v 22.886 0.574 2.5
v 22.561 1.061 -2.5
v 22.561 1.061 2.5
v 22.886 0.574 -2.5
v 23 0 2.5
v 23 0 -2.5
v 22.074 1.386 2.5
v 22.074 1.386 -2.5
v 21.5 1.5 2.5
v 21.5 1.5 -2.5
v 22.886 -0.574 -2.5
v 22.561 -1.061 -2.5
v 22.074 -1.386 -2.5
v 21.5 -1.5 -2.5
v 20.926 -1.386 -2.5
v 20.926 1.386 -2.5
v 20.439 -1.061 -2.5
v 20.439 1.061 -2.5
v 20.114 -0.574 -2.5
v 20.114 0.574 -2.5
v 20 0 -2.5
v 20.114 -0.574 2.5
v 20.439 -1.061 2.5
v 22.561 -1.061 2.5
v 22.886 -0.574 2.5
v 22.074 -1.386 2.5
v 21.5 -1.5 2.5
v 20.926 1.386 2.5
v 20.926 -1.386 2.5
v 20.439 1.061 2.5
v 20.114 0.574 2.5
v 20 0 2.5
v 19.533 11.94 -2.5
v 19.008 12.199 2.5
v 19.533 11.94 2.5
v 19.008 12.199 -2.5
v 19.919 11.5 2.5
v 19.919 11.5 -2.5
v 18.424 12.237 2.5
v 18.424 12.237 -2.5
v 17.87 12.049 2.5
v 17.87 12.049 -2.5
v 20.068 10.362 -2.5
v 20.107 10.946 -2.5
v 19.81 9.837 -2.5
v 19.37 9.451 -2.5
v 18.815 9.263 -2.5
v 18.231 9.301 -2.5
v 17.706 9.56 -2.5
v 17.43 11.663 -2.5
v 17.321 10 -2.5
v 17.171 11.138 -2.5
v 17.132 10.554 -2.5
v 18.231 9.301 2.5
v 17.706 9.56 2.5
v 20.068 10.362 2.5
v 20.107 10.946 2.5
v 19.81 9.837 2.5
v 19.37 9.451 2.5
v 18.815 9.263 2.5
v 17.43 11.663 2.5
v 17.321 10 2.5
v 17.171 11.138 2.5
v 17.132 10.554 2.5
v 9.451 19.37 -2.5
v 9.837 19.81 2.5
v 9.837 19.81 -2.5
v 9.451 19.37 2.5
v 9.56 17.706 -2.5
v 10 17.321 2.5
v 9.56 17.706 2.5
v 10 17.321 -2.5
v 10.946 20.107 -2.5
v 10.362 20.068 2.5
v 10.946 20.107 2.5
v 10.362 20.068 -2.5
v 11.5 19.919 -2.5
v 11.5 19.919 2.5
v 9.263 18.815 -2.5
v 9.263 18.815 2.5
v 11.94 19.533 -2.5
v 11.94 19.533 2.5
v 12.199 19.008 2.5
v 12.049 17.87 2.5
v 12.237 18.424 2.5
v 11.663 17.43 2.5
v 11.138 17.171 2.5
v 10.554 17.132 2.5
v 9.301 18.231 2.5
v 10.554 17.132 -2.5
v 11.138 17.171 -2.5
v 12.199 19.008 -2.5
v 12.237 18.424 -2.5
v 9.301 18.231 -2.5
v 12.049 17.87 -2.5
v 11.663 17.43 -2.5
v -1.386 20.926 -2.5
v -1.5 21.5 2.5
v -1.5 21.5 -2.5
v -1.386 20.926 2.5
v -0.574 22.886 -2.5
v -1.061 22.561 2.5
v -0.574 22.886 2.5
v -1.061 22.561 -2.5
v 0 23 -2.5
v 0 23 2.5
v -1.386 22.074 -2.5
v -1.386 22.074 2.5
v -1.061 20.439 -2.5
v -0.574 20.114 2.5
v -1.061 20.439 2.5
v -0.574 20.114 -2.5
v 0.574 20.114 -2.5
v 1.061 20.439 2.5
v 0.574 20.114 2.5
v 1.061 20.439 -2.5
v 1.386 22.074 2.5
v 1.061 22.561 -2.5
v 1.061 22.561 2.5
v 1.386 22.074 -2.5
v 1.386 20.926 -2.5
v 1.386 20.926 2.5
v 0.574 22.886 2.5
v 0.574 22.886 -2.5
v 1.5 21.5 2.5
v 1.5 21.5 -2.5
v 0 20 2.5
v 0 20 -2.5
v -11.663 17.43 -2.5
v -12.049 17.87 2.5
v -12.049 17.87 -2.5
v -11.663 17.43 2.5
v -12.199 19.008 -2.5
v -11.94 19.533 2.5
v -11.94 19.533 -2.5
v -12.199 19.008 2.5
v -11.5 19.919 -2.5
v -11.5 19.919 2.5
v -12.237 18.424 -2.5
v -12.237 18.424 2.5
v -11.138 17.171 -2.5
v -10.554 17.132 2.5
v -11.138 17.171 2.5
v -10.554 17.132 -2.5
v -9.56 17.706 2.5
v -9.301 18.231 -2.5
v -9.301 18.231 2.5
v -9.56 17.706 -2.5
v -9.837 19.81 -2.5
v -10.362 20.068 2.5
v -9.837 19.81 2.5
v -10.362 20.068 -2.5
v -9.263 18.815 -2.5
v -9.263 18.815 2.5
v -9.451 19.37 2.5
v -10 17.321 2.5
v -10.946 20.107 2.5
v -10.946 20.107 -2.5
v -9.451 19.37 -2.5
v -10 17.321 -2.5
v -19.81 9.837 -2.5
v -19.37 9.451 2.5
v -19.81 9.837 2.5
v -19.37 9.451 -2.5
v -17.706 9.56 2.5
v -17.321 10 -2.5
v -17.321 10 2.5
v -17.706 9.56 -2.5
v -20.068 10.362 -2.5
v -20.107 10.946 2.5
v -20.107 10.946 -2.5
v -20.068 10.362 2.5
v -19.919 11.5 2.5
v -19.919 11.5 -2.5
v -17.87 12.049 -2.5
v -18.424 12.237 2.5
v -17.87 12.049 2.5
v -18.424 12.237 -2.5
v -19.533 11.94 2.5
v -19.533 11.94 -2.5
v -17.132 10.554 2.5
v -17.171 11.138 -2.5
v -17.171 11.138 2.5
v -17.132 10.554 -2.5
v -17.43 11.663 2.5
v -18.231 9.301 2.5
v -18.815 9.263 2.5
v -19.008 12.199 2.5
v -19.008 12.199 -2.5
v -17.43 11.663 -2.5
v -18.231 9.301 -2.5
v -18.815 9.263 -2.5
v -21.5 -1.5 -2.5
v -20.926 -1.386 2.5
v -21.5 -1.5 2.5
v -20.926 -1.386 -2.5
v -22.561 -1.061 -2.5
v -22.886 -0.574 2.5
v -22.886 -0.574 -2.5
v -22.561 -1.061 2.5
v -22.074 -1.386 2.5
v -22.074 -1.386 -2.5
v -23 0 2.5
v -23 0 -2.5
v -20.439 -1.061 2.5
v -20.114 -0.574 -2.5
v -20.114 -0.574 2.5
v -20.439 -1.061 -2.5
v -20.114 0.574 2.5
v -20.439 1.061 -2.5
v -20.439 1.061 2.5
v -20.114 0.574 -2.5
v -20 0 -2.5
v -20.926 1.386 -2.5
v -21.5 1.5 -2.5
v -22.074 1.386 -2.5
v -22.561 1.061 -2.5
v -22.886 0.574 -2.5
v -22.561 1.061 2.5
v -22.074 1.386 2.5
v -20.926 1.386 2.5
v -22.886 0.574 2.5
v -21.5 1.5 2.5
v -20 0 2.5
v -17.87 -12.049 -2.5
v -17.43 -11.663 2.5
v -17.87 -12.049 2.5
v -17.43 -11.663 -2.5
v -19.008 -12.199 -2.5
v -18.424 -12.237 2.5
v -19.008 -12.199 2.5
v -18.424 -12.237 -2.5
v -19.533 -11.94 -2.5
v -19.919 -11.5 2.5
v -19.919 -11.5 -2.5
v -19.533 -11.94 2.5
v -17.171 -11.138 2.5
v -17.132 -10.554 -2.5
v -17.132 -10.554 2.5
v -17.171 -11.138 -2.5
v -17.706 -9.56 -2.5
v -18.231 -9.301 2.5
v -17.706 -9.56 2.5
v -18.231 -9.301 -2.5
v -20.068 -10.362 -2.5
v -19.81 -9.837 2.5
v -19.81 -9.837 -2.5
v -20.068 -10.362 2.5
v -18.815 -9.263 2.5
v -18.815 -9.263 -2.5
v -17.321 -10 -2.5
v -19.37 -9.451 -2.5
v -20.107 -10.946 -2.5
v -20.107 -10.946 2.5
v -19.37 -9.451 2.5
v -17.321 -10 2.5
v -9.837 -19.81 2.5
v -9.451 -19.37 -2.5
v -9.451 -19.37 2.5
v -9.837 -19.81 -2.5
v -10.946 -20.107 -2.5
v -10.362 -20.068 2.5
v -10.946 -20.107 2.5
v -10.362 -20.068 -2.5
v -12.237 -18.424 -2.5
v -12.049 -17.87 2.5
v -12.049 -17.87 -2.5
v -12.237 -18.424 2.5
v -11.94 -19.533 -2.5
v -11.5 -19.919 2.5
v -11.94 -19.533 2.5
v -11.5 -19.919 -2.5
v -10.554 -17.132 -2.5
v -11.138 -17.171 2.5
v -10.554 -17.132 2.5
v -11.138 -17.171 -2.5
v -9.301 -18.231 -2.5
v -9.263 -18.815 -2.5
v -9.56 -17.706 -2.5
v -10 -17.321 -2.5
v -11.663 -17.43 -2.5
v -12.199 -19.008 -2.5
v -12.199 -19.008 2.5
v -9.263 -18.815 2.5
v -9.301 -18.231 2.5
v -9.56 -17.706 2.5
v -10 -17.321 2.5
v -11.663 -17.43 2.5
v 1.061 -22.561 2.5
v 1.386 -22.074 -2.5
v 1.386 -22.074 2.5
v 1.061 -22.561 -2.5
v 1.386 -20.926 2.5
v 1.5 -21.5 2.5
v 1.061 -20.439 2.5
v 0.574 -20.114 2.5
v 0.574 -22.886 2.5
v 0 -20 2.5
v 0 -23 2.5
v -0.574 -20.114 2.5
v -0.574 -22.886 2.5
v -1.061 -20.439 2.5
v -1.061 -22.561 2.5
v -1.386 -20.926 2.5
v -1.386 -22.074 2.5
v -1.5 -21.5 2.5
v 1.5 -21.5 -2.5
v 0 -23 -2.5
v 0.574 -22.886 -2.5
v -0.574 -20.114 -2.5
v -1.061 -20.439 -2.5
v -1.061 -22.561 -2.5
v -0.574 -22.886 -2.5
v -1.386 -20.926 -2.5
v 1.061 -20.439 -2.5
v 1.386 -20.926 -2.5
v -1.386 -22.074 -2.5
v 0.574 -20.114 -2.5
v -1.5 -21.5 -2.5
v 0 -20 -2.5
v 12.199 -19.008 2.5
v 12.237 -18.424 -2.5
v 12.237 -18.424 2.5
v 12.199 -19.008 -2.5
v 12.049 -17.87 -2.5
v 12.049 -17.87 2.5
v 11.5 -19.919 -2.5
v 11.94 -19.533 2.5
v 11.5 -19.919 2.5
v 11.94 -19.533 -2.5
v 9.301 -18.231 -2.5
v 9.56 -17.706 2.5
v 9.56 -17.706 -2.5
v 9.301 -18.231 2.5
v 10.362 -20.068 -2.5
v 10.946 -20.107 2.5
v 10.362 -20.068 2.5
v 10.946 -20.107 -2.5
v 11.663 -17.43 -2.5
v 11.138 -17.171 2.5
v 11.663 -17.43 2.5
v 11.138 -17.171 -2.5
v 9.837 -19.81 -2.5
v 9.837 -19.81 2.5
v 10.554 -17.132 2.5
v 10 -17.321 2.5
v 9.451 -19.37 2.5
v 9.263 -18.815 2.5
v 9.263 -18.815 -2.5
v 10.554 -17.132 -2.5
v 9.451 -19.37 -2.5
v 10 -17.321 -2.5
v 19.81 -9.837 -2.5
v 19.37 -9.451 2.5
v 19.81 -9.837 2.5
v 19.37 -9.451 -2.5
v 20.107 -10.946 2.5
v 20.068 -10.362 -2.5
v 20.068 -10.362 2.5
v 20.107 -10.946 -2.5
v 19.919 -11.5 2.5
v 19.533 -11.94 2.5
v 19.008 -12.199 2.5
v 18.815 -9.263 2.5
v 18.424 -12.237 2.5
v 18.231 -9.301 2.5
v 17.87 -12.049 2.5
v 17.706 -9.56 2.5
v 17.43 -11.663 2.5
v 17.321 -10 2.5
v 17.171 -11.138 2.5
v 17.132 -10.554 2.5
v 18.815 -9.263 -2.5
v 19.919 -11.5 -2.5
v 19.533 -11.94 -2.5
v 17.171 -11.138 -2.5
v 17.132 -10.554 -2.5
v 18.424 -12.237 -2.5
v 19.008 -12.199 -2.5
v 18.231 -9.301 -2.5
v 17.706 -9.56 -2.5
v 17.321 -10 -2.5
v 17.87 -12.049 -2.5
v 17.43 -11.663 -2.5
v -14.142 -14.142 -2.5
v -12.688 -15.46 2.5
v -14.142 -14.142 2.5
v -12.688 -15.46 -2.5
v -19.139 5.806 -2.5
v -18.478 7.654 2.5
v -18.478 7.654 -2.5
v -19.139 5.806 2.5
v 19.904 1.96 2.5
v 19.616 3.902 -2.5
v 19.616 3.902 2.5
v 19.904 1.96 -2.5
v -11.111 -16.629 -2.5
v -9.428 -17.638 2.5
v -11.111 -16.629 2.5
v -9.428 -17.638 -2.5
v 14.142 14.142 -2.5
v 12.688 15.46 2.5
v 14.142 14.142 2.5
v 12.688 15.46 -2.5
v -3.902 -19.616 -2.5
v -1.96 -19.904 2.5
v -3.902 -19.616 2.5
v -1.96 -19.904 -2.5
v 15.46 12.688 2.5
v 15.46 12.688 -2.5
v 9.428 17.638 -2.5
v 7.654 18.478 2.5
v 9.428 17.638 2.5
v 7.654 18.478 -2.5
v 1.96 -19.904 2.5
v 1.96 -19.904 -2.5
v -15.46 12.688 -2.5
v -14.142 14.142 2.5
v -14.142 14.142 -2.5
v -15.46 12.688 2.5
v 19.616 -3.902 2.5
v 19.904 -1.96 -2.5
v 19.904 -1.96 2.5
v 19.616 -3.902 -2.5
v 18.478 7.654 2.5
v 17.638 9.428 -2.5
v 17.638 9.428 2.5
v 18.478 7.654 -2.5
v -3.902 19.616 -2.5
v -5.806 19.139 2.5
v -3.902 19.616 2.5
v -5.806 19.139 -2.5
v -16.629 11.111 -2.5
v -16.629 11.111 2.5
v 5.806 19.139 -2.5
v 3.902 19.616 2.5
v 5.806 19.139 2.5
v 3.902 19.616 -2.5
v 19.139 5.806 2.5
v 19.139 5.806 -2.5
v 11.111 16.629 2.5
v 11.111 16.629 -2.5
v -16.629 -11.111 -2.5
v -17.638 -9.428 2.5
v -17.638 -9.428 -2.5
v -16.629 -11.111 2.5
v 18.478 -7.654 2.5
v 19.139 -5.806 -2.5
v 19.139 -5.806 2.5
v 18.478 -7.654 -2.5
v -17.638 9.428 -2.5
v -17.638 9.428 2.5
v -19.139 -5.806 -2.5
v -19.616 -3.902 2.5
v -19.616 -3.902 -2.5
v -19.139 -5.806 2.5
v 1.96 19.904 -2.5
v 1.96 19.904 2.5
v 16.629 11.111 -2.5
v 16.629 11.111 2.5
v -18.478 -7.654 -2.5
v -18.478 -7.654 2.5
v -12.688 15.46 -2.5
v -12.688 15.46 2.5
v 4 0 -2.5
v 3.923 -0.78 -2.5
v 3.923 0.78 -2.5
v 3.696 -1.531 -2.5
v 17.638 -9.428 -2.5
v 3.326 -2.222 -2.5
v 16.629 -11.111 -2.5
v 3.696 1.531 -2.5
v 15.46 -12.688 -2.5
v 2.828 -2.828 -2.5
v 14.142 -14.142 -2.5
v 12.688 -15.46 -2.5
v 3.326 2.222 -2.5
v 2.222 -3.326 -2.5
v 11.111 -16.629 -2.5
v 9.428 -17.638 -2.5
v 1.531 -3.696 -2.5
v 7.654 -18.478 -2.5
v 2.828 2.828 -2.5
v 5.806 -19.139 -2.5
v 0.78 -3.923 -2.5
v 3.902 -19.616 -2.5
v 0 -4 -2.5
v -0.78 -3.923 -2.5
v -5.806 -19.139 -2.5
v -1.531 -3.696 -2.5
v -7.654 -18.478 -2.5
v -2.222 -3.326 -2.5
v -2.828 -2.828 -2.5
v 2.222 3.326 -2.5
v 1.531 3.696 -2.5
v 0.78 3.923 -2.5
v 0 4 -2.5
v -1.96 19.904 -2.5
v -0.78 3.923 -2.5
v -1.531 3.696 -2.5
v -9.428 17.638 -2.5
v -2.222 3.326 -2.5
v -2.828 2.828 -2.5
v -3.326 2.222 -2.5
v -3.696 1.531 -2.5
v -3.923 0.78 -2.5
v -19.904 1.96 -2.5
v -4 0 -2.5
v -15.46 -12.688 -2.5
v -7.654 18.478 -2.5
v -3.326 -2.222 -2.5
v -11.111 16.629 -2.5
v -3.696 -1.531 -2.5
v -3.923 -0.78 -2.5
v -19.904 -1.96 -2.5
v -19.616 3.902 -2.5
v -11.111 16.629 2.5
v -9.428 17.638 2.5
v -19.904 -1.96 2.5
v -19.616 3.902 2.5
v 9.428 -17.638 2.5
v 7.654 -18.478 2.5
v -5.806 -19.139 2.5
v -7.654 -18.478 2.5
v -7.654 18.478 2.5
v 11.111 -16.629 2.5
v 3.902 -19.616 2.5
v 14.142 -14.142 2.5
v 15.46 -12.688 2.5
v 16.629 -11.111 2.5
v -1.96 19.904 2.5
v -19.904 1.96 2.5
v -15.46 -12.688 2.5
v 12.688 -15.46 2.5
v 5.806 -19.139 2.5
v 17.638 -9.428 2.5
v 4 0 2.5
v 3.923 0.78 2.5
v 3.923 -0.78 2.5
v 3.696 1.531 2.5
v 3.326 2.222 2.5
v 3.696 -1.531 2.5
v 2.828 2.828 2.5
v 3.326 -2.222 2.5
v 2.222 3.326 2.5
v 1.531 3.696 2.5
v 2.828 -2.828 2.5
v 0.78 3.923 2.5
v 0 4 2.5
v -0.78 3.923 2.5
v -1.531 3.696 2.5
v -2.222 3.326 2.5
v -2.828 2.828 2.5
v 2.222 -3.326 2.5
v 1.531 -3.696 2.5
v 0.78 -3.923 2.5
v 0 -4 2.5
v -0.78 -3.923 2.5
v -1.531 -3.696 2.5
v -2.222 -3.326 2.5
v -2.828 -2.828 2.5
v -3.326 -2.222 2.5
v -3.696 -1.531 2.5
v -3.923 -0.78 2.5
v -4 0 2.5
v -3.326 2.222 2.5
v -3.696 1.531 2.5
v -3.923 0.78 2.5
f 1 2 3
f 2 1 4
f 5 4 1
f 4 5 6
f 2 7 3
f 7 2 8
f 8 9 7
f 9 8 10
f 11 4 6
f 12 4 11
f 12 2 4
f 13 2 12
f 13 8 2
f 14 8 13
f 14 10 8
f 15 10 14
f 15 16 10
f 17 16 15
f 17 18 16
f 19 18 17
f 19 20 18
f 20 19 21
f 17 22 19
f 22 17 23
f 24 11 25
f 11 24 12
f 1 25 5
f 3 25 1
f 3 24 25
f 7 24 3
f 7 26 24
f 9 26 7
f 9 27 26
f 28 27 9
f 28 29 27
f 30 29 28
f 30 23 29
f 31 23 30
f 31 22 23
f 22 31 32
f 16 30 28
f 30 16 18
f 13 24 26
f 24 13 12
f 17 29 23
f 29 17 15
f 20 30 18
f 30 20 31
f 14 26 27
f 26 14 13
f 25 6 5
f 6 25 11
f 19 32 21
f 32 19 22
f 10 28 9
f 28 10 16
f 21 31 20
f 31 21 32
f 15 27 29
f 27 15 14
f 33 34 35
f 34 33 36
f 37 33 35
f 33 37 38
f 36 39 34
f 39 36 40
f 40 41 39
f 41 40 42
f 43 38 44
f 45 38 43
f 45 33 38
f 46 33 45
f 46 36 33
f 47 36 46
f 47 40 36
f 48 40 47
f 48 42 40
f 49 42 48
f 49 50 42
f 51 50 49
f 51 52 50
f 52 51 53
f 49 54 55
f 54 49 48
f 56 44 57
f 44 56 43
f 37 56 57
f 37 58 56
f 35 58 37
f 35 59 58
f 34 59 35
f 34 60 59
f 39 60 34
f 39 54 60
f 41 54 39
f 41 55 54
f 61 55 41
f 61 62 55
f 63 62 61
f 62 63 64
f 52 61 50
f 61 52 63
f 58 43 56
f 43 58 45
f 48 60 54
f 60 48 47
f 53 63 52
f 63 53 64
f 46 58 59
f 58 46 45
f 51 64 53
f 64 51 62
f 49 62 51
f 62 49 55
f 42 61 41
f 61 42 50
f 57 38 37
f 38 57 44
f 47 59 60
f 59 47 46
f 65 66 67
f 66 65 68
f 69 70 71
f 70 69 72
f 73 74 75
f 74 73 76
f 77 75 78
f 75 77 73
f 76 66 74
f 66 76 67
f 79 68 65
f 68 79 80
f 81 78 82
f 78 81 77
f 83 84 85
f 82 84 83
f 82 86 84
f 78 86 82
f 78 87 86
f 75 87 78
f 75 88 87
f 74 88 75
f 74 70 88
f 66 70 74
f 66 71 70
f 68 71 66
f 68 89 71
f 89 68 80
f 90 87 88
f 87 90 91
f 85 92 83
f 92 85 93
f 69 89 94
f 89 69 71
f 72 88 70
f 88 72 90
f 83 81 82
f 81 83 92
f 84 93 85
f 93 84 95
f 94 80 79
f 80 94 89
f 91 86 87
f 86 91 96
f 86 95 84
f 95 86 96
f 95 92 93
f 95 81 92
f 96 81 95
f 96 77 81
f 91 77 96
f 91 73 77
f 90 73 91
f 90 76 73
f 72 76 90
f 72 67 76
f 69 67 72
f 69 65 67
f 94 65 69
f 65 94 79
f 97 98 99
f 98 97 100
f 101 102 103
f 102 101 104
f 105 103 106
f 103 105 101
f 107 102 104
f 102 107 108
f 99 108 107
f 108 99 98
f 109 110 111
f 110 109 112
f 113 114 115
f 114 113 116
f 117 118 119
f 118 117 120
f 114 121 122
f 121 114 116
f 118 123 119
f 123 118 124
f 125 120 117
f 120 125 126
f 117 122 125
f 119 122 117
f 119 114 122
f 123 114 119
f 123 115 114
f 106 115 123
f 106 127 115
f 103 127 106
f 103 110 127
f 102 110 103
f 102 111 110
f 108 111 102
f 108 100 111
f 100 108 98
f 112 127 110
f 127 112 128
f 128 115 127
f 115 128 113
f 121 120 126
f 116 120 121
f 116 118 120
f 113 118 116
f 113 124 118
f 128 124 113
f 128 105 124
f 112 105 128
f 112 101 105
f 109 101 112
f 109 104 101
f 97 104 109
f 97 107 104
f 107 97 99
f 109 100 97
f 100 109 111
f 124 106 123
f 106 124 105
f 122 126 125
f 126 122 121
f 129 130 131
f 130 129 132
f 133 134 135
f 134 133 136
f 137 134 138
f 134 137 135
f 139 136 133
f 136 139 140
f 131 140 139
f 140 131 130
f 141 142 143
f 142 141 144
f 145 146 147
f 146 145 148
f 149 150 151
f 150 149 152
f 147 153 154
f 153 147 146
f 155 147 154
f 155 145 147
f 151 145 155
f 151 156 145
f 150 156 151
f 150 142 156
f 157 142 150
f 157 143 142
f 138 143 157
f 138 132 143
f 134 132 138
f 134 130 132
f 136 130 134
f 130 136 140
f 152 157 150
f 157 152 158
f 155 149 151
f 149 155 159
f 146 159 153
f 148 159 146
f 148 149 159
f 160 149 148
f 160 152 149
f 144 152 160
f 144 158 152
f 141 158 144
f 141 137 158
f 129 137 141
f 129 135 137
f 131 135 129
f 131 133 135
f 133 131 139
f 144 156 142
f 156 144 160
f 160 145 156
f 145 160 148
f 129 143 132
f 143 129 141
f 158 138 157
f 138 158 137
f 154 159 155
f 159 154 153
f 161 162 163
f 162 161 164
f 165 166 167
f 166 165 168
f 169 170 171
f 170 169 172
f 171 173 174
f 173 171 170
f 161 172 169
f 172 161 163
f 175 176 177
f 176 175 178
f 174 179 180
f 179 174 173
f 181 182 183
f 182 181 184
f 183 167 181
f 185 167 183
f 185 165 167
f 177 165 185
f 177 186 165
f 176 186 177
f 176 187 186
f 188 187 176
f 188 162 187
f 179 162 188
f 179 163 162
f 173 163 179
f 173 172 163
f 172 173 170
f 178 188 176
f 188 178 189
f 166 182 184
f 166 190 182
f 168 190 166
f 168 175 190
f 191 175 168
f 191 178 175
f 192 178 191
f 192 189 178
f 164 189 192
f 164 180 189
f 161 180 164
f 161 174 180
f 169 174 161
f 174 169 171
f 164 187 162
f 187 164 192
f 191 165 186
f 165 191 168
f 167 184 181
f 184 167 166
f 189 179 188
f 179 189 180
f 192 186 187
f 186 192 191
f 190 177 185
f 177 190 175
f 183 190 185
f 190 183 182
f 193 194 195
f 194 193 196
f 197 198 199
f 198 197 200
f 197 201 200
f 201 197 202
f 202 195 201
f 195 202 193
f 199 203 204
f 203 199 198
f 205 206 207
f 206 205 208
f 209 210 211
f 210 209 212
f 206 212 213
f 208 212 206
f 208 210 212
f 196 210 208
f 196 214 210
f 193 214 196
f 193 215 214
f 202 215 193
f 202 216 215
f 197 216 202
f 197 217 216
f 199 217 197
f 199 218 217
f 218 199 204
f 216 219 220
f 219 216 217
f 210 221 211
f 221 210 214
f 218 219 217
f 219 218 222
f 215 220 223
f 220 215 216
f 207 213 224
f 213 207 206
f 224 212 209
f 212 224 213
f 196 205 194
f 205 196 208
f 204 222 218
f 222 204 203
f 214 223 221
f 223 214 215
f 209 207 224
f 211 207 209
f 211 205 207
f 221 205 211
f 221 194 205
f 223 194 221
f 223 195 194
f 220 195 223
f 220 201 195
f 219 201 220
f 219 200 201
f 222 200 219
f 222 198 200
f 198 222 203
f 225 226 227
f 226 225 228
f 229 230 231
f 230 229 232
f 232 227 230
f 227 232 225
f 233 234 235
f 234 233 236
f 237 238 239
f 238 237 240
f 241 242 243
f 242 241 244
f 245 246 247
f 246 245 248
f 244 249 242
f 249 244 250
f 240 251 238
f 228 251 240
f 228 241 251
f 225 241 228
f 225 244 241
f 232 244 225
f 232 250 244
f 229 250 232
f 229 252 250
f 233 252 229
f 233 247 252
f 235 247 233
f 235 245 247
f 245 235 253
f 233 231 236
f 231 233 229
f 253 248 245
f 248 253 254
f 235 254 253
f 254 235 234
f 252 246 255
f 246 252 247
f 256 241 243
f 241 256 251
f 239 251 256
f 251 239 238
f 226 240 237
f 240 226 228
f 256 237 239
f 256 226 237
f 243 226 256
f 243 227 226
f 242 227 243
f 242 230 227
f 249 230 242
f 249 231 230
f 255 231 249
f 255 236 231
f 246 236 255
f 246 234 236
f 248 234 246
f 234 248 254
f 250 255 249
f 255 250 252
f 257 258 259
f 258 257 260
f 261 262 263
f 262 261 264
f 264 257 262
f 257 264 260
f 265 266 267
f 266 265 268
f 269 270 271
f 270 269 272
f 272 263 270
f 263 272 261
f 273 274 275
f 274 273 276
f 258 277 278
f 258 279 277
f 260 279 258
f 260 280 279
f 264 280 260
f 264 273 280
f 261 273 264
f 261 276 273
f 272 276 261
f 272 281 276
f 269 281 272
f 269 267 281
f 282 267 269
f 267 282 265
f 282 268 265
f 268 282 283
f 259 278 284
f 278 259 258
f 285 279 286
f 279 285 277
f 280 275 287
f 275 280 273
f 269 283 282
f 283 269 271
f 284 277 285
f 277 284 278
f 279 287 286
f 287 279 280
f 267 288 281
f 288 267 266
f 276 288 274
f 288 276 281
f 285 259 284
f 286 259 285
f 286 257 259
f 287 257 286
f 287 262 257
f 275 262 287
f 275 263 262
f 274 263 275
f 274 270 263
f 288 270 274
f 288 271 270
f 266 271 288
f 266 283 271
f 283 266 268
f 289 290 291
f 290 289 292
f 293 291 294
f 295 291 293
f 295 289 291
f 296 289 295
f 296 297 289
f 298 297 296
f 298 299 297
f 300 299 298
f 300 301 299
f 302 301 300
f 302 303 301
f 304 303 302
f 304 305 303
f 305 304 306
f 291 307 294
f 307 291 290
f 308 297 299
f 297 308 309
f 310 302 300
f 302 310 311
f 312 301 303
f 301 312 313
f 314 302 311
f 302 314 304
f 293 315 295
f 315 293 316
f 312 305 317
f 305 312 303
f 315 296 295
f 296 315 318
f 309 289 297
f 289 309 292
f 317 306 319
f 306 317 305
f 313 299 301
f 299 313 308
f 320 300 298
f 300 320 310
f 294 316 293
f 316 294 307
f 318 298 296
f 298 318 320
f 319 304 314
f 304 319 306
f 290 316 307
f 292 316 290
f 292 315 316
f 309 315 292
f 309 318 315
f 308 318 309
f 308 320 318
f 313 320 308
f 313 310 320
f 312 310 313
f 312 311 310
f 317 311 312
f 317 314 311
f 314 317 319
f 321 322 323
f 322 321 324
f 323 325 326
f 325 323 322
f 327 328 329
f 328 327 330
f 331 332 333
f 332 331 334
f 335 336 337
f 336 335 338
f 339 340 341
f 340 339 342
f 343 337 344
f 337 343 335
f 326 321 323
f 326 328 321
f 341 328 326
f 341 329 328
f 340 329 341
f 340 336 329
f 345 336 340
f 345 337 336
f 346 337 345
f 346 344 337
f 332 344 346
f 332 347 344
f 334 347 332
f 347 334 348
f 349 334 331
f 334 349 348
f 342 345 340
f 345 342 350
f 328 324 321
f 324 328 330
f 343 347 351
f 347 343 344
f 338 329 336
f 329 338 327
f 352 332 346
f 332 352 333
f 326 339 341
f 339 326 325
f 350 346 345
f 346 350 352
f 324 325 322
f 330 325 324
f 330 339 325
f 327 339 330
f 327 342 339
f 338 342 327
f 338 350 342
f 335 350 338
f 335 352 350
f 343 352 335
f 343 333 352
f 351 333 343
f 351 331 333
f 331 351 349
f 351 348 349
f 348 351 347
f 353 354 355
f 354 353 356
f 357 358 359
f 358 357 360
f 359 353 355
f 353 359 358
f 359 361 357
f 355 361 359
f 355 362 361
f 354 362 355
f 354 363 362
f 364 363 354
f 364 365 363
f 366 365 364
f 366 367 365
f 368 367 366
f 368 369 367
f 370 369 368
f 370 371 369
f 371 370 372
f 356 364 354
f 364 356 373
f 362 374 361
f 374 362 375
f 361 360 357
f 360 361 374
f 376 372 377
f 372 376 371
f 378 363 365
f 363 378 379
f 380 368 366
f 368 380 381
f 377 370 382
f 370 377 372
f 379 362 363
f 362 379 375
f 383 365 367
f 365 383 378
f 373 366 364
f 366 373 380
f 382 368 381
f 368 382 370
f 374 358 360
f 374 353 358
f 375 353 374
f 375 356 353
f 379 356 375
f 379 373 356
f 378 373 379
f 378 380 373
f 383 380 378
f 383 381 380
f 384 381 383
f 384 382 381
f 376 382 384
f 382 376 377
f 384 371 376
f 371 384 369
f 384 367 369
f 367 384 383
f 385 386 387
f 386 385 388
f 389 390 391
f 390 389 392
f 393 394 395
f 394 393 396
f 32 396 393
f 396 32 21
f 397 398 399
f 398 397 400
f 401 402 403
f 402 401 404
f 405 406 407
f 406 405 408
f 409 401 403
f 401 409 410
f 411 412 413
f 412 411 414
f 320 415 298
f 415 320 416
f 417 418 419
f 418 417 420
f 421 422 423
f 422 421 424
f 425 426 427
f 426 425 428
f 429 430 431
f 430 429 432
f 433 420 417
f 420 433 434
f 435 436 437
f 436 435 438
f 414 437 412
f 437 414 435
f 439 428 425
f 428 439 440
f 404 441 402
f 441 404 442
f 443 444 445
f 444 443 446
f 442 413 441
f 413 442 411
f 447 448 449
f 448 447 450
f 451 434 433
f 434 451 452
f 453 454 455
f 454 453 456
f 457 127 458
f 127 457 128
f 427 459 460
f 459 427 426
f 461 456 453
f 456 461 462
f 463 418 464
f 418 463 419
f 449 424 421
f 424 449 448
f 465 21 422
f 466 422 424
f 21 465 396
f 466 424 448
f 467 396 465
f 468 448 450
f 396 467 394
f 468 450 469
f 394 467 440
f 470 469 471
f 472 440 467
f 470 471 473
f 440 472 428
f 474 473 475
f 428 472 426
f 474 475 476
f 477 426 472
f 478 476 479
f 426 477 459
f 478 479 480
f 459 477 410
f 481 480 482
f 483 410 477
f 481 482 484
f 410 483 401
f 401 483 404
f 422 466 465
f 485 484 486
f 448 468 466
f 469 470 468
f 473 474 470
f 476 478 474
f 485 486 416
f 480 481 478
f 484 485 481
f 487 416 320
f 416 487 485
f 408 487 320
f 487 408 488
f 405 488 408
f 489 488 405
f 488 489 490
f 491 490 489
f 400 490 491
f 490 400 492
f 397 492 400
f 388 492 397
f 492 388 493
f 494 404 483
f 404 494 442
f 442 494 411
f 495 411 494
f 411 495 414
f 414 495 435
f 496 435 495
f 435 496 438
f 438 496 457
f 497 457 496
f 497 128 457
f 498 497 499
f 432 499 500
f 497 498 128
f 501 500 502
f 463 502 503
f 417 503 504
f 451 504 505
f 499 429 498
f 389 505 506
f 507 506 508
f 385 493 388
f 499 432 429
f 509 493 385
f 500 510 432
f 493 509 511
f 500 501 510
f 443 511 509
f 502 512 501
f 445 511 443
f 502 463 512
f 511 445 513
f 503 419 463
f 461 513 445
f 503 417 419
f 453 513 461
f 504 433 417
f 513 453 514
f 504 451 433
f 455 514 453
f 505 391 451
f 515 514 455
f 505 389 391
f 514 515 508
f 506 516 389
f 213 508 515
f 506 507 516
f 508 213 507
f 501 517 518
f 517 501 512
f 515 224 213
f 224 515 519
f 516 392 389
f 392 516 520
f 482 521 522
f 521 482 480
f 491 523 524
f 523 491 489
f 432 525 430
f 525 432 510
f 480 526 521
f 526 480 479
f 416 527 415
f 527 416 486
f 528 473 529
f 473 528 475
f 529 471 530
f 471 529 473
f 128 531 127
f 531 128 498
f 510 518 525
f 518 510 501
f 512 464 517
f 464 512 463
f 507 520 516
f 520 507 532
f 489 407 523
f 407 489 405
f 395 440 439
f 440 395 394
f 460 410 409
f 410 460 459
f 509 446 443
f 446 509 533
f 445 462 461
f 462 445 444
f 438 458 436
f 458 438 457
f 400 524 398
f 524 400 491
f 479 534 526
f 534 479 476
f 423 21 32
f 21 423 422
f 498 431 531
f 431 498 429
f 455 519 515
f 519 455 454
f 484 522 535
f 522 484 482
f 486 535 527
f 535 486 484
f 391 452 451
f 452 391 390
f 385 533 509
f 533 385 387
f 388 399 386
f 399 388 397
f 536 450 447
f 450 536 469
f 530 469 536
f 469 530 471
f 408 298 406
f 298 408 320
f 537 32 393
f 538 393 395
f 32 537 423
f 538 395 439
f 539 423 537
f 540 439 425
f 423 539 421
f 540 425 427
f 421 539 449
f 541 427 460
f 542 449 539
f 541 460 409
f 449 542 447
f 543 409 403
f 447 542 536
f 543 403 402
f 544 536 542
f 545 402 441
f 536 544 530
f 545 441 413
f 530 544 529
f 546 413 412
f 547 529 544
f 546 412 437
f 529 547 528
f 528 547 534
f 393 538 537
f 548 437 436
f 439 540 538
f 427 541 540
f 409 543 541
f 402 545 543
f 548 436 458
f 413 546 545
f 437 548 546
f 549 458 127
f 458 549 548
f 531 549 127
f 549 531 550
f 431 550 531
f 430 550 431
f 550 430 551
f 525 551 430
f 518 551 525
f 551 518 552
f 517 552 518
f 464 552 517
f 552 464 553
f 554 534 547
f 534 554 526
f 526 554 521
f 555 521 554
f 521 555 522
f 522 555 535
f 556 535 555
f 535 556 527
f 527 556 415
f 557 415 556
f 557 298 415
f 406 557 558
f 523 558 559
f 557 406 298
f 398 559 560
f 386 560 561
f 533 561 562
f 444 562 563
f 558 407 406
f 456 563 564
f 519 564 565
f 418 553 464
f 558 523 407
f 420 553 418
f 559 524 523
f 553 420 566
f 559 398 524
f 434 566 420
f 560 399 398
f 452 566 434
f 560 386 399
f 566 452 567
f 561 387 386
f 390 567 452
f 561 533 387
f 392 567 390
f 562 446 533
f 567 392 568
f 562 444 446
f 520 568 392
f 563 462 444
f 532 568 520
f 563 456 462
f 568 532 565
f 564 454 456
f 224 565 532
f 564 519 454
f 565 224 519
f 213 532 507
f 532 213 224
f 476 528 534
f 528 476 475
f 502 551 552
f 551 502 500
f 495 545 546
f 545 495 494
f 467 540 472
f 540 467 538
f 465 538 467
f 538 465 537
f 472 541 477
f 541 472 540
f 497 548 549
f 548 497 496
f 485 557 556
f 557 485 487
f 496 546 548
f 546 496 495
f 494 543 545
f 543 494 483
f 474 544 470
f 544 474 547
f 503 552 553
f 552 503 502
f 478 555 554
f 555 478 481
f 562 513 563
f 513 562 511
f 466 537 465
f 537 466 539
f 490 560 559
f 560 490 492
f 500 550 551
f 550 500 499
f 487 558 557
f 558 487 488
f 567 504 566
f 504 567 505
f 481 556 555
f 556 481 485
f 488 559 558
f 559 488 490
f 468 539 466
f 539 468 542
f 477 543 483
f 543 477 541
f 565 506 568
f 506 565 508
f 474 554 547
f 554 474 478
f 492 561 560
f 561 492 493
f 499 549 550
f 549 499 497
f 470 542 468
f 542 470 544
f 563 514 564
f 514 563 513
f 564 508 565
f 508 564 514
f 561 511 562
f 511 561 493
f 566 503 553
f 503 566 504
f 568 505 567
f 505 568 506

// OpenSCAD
// Simple Spur Gear (illustrative — uses cylinders for teeth)
// Parameters:
//   teeth      — number of gear teeth
//   pitch_r    — pitch radius (mm)
//   tooth_h    — tooth height (mm)
//   thickness  — gear thickness (mm)
//   bore_r     — center bore radius (mm)

teeth     = 12;
pitch_r   = 20;
tooth_h   = 3;
thickness = 5;
bore_r    = 4;

tooth_r   = tooth_h / 2;            // radius of each tooth cylinder
tooth_pos = pitch_r + tooth_r;      // distance from center to tooth center

module gear(t, pr, th, tk, br) {
    difference() {
        union() {
            // Gear body disc
            cylinder(h=tk, r=pr, center=true, $fn=64);

            // Teeth arranged around the circumference
            for (i = [0 : t - 1]) {
                rotate([0, 0, i * (360 / t)])
                    translate([pr + th/2, 0, 0])
                        cylinder(h=tk, r=th/2, center=true, $fn=16);
            }
        }
        // Center bore
        cylinder(h=tk + 1, r=br, center=true, $fn=32);
    }
}

gear(teeth, pitch_r, tooth_h, thickness, bore_r);
